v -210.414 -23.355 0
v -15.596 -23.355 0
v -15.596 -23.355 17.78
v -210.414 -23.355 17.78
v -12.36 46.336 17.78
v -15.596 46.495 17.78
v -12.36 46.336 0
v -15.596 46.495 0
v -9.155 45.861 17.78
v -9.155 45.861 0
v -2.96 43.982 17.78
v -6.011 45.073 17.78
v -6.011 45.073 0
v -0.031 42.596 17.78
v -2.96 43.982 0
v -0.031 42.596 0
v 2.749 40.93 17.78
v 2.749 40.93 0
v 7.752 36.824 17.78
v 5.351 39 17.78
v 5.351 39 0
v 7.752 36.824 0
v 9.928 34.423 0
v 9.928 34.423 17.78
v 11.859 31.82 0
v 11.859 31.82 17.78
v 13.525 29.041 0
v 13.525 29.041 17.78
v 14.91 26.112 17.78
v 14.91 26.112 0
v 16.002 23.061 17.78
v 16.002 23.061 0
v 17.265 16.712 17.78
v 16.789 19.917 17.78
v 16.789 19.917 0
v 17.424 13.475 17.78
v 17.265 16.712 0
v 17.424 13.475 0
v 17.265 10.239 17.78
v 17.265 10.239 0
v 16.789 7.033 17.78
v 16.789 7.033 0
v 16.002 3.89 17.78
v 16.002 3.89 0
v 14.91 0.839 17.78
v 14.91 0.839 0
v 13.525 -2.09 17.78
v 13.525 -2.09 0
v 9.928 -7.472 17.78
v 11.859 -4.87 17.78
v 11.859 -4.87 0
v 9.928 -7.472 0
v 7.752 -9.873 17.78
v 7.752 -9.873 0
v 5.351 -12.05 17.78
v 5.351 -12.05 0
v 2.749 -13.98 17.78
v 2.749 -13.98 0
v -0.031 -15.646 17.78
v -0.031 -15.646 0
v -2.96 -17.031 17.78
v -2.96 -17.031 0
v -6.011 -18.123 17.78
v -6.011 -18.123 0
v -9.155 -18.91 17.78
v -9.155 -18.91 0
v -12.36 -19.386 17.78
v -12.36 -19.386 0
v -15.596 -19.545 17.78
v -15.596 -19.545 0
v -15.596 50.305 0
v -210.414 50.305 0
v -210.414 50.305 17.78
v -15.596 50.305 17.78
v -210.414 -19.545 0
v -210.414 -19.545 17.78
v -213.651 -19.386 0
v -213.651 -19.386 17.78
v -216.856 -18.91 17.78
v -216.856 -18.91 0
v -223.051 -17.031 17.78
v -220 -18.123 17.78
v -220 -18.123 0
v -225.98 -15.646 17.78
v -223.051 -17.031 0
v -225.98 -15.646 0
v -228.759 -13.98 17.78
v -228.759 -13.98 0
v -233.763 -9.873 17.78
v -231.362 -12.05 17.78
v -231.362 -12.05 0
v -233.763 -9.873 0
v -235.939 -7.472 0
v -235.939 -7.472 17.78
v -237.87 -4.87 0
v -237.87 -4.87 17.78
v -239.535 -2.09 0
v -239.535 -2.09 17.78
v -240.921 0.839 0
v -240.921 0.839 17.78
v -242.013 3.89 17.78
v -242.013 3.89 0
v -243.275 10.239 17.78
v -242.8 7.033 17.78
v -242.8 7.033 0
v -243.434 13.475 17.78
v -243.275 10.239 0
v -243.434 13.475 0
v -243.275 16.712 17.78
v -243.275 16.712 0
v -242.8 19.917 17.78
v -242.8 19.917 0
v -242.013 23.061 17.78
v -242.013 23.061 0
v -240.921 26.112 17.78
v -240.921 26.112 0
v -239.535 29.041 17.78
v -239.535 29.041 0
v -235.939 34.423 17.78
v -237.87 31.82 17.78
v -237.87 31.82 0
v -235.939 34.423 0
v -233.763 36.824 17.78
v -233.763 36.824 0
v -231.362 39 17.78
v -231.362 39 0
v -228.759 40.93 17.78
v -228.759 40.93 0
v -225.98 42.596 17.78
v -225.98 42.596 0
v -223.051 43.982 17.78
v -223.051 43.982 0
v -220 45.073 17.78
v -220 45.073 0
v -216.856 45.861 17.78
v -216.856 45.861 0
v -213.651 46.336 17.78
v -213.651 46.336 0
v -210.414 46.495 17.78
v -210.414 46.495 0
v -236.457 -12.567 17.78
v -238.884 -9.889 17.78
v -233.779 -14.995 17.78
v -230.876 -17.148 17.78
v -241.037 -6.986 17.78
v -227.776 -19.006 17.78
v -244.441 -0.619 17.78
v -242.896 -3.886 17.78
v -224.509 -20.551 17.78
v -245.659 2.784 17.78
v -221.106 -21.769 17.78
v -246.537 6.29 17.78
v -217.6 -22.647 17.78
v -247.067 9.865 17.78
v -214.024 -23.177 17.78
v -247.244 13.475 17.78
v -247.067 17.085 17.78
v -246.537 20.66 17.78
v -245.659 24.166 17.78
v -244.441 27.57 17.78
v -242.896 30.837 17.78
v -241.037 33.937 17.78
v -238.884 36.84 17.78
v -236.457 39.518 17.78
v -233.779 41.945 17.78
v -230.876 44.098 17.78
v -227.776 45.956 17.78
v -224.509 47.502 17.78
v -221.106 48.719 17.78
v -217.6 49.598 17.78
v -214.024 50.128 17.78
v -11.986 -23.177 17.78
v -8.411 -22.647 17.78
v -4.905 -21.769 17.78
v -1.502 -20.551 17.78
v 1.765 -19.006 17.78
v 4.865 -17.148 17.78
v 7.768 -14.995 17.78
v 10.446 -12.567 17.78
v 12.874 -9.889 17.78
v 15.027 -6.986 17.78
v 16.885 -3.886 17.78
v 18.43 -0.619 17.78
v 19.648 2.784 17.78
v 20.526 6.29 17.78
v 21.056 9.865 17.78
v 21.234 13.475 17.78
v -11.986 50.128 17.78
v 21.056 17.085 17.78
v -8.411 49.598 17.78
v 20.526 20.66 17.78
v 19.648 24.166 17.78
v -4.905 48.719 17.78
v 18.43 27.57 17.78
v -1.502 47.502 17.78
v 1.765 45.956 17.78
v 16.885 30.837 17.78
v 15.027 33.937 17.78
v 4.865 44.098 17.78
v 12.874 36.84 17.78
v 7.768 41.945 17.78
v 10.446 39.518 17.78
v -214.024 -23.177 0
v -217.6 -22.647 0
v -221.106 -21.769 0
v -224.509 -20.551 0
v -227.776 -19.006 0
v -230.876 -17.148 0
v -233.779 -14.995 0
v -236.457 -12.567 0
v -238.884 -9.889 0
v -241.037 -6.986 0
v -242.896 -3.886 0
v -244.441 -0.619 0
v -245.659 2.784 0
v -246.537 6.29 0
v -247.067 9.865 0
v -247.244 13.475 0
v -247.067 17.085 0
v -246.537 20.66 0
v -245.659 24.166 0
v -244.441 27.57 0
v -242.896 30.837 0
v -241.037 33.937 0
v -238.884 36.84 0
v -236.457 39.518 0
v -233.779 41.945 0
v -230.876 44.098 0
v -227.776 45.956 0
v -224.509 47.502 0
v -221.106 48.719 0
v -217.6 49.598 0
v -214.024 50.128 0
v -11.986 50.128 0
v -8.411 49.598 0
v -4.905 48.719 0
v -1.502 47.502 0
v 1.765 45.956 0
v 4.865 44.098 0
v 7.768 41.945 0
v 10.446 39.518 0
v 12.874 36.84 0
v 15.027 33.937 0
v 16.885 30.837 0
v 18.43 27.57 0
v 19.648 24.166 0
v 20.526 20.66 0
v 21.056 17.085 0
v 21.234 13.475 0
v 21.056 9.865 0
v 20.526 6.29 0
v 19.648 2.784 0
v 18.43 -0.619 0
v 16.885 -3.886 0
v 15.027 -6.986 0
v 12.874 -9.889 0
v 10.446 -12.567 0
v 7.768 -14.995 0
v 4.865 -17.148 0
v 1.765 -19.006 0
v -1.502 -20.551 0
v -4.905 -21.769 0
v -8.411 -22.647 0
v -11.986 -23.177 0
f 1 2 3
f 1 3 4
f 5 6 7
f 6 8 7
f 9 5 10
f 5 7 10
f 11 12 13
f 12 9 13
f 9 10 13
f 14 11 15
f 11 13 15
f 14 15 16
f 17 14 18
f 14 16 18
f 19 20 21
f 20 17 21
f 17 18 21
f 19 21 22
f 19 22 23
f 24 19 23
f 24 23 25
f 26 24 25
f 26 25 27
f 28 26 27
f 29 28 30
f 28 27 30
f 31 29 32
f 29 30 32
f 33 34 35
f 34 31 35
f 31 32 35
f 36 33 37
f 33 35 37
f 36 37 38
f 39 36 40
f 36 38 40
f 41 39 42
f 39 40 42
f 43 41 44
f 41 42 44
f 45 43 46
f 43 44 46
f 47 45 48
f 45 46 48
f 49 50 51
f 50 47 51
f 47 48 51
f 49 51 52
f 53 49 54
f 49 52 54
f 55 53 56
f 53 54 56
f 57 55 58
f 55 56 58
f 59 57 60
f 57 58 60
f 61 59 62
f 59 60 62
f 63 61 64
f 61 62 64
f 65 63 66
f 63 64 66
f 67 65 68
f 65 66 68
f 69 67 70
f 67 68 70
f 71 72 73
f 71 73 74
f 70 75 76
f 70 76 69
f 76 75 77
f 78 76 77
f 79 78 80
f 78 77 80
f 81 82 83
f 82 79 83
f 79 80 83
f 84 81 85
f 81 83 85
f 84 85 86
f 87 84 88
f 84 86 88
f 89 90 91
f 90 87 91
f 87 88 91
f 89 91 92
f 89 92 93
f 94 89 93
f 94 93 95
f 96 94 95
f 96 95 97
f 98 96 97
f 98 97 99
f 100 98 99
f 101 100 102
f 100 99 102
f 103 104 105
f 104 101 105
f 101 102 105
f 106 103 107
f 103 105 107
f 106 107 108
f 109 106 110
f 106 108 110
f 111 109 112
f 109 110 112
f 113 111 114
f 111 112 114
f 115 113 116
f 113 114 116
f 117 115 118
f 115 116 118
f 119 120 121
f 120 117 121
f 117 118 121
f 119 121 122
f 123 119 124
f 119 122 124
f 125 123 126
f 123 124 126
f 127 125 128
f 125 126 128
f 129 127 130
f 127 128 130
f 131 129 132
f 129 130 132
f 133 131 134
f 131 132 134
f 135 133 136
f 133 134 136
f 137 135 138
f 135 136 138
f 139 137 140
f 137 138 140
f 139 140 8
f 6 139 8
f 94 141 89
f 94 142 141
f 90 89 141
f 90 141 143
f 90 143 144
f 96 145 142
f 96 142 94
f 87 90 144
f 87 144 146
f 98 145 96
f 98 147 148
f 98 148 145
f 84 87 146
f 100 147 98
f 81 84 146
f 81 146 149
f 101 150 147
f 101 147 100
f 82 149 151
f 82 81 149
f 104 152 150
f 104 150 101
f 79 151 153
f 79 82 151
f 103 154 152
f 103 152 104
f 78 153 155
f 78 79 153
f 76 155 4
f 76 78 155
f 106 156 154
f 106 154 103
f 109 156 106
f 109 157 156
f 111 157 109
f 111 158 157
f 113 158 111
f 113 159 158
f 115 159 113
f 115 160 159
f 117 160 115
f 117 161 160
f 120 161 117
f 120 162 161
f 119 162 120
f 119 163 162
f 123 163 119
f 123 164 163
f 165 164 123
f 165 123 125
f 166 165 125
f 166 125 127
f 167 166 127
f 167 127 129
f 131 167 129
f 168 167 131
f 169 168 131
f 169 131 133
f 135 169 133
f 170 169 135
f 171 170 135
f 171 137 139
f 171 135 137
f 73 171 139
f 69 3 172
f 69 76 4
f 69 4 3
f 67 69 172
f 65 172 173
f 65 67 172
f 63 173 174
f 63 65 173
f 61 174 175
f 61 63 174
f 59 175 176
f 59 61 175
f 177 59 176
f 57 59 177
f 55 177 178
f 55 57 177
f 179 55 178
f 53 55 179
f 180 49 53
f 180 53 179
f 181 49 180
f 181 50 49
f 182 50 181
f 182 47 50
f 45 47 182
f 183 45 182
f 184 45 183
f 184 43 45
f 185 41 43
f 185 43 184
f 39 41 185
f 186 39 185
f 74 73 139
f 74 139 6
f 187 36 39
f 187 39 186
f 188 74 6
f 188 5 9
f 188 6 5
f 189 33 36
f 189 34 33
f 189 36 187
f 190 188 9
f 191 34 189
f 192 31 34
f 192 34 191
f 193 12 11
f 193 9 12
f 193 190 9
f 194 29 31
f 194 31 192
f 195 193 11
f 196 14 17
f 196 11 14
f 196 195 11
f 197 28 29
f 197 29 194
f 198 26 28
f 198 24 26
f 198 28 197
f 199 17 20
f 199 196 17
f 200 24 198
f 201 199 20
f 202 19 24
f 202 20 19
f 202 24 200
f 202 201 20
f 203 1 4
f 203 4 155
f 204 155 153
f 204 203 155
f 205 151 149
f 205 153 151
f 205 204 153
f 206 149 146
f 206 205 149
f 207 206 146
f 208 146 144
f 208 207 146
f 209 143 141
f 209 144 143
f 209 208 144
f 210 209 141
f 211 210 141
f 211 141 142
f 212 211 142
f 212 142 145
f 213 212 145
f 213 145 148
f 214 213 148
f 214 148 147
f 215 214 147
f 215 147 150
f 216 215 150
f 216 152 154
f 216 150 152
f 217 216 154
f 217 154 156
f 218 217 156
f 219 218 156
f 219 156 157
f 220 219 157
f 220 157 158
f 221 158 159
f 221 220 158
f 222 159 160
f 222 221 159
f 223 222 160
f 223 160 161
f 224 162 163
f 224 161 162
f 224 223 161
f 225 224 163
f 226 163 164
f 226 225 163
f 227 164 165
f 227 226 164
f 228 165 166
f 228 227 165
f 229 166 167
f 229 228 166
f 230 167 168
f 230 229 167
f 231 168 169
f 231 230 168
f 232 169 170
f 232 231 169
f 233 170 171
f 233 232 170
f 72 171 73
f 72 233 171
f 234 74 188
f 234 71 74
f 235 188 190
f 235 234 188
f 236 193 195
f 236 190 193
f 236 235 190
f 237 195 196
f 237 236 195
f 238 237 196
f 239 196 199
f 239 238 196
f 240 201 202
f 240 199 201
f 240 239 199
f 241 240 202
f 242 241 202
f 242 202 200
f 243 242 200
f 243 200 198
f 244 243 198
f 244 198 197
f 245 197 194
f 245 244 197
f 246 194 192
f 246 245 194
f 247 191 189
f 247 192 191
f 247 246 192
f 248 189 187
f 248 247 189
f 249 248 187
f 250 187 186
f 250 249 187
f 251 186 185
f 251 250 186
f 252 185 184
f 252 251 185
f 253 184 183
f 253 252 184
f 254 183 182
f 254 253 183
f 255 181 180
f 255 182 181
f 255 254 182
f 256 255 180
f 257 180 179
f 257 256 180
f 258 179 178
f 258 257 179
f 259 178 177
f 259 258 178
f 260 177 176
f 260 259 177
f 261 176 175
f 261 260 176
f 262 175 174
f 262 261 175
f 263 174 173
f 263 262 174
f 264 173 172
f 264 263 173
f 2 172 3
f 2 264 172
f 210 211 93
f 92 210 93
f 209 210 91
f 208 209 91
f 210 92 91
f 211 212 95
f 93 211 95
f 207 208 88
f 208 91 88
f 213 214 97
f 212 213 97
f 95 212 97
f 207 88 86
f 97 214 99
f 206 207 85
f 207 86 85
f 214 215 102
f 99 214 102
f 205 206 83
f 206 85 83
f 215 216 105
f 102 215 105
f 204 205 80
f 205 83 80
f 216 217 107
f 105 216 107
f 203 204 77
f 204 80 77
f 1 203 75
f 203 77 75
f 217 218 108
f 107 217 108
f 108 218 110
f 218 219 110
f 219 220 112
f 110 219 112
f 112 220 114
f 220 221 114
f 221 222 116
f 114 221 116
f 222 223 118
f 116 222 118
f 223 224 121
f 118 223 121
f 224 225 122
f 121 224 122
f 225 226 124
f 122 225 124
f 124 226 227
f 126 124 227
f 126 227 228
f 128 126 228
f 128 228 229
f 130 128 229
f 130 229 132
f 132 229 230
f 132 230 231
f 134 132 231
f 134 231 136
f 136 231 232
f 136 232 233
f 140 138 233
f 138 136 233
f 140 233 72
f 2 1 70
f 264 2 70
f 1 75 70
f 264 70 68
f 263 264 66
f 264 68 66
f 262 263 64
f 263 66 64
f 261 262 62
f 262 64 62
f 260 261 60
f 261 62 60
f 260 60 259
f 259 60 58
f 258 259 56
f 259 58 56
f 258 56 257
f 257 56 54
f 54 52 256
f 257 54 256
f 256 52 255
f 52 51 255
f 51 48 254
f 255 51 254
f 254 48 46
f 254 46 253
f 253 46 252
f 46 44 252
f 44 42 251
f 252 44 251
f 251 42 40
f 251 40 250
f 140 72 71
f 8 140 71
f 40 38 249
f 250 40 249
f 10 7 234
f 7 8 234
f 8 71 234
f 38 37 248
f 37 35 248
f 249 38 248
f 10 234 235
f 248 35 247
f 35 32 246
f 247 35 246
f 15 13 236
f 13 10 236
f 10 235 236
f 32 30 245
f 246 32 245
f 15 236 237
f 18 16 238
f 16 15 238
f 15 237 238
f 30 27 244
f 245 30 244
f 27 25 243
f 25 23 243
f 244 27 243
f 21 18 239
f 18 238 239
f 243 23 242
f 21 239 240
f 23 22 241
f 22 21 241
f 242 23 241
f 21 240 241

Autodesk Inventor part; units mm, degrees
ref_plane "YZ Plane" through (0, 0, 0) normal (1, 0, 0) x (0, 1, 0)
ref_plane "XZ Plane" through (0, 0, 0) normal (0, 1, 0) x (-1, 0, 0)
ref_plane "XY Plane" through (0, 0, 0) normal (0, 0, 1) x (1, 0, 0)
sketch "Sketch1" plane through (0, 0, 0) normal (0, 0, 1) x (1, 0, 0)
  arc A0 (-210.4144, 46.4953) -> (-210.4144, -19.5447) centre (-210.4144, 13.4753) ccw
  arc A1 (-15.5964, -19.5447) -> (-15.5964, 46.4953) centre (-15.5964, 13.4753) ccw
  line L0 (-210.4144, 46.4953) -> (-15.5964, 46.4953)
  line L1 (-210.4144, -19.5447) -> (-15.5964, -19.5447)
  arc A2 (-15.5964, -23.3547) -> (-15.5964, 50.3053) centre (-15.5964, 13.4753) ccw
  line L2 (-15.5964, -23.3547) -> (-210.4144, -23.3547)
  arc A3 (-210.4144, 50.3053) -> (-210.4144, -23.3547) centre (-210.4144, 13.4753) ccw
  line L3 (-210.4144, 50.3053) -> (-15.5964, 50.3053)
  point P0 (0, 0)
  dimension "d0" = 66.04
  dimension "d1" = 66.04
  dimension "d2" = 194.818
  dimension "d3" = 3.81
extrude "Extrusion1" add sketch "Sketch1" along normal blind 17.78
properties part number "Chassis_7.67inBelt"
